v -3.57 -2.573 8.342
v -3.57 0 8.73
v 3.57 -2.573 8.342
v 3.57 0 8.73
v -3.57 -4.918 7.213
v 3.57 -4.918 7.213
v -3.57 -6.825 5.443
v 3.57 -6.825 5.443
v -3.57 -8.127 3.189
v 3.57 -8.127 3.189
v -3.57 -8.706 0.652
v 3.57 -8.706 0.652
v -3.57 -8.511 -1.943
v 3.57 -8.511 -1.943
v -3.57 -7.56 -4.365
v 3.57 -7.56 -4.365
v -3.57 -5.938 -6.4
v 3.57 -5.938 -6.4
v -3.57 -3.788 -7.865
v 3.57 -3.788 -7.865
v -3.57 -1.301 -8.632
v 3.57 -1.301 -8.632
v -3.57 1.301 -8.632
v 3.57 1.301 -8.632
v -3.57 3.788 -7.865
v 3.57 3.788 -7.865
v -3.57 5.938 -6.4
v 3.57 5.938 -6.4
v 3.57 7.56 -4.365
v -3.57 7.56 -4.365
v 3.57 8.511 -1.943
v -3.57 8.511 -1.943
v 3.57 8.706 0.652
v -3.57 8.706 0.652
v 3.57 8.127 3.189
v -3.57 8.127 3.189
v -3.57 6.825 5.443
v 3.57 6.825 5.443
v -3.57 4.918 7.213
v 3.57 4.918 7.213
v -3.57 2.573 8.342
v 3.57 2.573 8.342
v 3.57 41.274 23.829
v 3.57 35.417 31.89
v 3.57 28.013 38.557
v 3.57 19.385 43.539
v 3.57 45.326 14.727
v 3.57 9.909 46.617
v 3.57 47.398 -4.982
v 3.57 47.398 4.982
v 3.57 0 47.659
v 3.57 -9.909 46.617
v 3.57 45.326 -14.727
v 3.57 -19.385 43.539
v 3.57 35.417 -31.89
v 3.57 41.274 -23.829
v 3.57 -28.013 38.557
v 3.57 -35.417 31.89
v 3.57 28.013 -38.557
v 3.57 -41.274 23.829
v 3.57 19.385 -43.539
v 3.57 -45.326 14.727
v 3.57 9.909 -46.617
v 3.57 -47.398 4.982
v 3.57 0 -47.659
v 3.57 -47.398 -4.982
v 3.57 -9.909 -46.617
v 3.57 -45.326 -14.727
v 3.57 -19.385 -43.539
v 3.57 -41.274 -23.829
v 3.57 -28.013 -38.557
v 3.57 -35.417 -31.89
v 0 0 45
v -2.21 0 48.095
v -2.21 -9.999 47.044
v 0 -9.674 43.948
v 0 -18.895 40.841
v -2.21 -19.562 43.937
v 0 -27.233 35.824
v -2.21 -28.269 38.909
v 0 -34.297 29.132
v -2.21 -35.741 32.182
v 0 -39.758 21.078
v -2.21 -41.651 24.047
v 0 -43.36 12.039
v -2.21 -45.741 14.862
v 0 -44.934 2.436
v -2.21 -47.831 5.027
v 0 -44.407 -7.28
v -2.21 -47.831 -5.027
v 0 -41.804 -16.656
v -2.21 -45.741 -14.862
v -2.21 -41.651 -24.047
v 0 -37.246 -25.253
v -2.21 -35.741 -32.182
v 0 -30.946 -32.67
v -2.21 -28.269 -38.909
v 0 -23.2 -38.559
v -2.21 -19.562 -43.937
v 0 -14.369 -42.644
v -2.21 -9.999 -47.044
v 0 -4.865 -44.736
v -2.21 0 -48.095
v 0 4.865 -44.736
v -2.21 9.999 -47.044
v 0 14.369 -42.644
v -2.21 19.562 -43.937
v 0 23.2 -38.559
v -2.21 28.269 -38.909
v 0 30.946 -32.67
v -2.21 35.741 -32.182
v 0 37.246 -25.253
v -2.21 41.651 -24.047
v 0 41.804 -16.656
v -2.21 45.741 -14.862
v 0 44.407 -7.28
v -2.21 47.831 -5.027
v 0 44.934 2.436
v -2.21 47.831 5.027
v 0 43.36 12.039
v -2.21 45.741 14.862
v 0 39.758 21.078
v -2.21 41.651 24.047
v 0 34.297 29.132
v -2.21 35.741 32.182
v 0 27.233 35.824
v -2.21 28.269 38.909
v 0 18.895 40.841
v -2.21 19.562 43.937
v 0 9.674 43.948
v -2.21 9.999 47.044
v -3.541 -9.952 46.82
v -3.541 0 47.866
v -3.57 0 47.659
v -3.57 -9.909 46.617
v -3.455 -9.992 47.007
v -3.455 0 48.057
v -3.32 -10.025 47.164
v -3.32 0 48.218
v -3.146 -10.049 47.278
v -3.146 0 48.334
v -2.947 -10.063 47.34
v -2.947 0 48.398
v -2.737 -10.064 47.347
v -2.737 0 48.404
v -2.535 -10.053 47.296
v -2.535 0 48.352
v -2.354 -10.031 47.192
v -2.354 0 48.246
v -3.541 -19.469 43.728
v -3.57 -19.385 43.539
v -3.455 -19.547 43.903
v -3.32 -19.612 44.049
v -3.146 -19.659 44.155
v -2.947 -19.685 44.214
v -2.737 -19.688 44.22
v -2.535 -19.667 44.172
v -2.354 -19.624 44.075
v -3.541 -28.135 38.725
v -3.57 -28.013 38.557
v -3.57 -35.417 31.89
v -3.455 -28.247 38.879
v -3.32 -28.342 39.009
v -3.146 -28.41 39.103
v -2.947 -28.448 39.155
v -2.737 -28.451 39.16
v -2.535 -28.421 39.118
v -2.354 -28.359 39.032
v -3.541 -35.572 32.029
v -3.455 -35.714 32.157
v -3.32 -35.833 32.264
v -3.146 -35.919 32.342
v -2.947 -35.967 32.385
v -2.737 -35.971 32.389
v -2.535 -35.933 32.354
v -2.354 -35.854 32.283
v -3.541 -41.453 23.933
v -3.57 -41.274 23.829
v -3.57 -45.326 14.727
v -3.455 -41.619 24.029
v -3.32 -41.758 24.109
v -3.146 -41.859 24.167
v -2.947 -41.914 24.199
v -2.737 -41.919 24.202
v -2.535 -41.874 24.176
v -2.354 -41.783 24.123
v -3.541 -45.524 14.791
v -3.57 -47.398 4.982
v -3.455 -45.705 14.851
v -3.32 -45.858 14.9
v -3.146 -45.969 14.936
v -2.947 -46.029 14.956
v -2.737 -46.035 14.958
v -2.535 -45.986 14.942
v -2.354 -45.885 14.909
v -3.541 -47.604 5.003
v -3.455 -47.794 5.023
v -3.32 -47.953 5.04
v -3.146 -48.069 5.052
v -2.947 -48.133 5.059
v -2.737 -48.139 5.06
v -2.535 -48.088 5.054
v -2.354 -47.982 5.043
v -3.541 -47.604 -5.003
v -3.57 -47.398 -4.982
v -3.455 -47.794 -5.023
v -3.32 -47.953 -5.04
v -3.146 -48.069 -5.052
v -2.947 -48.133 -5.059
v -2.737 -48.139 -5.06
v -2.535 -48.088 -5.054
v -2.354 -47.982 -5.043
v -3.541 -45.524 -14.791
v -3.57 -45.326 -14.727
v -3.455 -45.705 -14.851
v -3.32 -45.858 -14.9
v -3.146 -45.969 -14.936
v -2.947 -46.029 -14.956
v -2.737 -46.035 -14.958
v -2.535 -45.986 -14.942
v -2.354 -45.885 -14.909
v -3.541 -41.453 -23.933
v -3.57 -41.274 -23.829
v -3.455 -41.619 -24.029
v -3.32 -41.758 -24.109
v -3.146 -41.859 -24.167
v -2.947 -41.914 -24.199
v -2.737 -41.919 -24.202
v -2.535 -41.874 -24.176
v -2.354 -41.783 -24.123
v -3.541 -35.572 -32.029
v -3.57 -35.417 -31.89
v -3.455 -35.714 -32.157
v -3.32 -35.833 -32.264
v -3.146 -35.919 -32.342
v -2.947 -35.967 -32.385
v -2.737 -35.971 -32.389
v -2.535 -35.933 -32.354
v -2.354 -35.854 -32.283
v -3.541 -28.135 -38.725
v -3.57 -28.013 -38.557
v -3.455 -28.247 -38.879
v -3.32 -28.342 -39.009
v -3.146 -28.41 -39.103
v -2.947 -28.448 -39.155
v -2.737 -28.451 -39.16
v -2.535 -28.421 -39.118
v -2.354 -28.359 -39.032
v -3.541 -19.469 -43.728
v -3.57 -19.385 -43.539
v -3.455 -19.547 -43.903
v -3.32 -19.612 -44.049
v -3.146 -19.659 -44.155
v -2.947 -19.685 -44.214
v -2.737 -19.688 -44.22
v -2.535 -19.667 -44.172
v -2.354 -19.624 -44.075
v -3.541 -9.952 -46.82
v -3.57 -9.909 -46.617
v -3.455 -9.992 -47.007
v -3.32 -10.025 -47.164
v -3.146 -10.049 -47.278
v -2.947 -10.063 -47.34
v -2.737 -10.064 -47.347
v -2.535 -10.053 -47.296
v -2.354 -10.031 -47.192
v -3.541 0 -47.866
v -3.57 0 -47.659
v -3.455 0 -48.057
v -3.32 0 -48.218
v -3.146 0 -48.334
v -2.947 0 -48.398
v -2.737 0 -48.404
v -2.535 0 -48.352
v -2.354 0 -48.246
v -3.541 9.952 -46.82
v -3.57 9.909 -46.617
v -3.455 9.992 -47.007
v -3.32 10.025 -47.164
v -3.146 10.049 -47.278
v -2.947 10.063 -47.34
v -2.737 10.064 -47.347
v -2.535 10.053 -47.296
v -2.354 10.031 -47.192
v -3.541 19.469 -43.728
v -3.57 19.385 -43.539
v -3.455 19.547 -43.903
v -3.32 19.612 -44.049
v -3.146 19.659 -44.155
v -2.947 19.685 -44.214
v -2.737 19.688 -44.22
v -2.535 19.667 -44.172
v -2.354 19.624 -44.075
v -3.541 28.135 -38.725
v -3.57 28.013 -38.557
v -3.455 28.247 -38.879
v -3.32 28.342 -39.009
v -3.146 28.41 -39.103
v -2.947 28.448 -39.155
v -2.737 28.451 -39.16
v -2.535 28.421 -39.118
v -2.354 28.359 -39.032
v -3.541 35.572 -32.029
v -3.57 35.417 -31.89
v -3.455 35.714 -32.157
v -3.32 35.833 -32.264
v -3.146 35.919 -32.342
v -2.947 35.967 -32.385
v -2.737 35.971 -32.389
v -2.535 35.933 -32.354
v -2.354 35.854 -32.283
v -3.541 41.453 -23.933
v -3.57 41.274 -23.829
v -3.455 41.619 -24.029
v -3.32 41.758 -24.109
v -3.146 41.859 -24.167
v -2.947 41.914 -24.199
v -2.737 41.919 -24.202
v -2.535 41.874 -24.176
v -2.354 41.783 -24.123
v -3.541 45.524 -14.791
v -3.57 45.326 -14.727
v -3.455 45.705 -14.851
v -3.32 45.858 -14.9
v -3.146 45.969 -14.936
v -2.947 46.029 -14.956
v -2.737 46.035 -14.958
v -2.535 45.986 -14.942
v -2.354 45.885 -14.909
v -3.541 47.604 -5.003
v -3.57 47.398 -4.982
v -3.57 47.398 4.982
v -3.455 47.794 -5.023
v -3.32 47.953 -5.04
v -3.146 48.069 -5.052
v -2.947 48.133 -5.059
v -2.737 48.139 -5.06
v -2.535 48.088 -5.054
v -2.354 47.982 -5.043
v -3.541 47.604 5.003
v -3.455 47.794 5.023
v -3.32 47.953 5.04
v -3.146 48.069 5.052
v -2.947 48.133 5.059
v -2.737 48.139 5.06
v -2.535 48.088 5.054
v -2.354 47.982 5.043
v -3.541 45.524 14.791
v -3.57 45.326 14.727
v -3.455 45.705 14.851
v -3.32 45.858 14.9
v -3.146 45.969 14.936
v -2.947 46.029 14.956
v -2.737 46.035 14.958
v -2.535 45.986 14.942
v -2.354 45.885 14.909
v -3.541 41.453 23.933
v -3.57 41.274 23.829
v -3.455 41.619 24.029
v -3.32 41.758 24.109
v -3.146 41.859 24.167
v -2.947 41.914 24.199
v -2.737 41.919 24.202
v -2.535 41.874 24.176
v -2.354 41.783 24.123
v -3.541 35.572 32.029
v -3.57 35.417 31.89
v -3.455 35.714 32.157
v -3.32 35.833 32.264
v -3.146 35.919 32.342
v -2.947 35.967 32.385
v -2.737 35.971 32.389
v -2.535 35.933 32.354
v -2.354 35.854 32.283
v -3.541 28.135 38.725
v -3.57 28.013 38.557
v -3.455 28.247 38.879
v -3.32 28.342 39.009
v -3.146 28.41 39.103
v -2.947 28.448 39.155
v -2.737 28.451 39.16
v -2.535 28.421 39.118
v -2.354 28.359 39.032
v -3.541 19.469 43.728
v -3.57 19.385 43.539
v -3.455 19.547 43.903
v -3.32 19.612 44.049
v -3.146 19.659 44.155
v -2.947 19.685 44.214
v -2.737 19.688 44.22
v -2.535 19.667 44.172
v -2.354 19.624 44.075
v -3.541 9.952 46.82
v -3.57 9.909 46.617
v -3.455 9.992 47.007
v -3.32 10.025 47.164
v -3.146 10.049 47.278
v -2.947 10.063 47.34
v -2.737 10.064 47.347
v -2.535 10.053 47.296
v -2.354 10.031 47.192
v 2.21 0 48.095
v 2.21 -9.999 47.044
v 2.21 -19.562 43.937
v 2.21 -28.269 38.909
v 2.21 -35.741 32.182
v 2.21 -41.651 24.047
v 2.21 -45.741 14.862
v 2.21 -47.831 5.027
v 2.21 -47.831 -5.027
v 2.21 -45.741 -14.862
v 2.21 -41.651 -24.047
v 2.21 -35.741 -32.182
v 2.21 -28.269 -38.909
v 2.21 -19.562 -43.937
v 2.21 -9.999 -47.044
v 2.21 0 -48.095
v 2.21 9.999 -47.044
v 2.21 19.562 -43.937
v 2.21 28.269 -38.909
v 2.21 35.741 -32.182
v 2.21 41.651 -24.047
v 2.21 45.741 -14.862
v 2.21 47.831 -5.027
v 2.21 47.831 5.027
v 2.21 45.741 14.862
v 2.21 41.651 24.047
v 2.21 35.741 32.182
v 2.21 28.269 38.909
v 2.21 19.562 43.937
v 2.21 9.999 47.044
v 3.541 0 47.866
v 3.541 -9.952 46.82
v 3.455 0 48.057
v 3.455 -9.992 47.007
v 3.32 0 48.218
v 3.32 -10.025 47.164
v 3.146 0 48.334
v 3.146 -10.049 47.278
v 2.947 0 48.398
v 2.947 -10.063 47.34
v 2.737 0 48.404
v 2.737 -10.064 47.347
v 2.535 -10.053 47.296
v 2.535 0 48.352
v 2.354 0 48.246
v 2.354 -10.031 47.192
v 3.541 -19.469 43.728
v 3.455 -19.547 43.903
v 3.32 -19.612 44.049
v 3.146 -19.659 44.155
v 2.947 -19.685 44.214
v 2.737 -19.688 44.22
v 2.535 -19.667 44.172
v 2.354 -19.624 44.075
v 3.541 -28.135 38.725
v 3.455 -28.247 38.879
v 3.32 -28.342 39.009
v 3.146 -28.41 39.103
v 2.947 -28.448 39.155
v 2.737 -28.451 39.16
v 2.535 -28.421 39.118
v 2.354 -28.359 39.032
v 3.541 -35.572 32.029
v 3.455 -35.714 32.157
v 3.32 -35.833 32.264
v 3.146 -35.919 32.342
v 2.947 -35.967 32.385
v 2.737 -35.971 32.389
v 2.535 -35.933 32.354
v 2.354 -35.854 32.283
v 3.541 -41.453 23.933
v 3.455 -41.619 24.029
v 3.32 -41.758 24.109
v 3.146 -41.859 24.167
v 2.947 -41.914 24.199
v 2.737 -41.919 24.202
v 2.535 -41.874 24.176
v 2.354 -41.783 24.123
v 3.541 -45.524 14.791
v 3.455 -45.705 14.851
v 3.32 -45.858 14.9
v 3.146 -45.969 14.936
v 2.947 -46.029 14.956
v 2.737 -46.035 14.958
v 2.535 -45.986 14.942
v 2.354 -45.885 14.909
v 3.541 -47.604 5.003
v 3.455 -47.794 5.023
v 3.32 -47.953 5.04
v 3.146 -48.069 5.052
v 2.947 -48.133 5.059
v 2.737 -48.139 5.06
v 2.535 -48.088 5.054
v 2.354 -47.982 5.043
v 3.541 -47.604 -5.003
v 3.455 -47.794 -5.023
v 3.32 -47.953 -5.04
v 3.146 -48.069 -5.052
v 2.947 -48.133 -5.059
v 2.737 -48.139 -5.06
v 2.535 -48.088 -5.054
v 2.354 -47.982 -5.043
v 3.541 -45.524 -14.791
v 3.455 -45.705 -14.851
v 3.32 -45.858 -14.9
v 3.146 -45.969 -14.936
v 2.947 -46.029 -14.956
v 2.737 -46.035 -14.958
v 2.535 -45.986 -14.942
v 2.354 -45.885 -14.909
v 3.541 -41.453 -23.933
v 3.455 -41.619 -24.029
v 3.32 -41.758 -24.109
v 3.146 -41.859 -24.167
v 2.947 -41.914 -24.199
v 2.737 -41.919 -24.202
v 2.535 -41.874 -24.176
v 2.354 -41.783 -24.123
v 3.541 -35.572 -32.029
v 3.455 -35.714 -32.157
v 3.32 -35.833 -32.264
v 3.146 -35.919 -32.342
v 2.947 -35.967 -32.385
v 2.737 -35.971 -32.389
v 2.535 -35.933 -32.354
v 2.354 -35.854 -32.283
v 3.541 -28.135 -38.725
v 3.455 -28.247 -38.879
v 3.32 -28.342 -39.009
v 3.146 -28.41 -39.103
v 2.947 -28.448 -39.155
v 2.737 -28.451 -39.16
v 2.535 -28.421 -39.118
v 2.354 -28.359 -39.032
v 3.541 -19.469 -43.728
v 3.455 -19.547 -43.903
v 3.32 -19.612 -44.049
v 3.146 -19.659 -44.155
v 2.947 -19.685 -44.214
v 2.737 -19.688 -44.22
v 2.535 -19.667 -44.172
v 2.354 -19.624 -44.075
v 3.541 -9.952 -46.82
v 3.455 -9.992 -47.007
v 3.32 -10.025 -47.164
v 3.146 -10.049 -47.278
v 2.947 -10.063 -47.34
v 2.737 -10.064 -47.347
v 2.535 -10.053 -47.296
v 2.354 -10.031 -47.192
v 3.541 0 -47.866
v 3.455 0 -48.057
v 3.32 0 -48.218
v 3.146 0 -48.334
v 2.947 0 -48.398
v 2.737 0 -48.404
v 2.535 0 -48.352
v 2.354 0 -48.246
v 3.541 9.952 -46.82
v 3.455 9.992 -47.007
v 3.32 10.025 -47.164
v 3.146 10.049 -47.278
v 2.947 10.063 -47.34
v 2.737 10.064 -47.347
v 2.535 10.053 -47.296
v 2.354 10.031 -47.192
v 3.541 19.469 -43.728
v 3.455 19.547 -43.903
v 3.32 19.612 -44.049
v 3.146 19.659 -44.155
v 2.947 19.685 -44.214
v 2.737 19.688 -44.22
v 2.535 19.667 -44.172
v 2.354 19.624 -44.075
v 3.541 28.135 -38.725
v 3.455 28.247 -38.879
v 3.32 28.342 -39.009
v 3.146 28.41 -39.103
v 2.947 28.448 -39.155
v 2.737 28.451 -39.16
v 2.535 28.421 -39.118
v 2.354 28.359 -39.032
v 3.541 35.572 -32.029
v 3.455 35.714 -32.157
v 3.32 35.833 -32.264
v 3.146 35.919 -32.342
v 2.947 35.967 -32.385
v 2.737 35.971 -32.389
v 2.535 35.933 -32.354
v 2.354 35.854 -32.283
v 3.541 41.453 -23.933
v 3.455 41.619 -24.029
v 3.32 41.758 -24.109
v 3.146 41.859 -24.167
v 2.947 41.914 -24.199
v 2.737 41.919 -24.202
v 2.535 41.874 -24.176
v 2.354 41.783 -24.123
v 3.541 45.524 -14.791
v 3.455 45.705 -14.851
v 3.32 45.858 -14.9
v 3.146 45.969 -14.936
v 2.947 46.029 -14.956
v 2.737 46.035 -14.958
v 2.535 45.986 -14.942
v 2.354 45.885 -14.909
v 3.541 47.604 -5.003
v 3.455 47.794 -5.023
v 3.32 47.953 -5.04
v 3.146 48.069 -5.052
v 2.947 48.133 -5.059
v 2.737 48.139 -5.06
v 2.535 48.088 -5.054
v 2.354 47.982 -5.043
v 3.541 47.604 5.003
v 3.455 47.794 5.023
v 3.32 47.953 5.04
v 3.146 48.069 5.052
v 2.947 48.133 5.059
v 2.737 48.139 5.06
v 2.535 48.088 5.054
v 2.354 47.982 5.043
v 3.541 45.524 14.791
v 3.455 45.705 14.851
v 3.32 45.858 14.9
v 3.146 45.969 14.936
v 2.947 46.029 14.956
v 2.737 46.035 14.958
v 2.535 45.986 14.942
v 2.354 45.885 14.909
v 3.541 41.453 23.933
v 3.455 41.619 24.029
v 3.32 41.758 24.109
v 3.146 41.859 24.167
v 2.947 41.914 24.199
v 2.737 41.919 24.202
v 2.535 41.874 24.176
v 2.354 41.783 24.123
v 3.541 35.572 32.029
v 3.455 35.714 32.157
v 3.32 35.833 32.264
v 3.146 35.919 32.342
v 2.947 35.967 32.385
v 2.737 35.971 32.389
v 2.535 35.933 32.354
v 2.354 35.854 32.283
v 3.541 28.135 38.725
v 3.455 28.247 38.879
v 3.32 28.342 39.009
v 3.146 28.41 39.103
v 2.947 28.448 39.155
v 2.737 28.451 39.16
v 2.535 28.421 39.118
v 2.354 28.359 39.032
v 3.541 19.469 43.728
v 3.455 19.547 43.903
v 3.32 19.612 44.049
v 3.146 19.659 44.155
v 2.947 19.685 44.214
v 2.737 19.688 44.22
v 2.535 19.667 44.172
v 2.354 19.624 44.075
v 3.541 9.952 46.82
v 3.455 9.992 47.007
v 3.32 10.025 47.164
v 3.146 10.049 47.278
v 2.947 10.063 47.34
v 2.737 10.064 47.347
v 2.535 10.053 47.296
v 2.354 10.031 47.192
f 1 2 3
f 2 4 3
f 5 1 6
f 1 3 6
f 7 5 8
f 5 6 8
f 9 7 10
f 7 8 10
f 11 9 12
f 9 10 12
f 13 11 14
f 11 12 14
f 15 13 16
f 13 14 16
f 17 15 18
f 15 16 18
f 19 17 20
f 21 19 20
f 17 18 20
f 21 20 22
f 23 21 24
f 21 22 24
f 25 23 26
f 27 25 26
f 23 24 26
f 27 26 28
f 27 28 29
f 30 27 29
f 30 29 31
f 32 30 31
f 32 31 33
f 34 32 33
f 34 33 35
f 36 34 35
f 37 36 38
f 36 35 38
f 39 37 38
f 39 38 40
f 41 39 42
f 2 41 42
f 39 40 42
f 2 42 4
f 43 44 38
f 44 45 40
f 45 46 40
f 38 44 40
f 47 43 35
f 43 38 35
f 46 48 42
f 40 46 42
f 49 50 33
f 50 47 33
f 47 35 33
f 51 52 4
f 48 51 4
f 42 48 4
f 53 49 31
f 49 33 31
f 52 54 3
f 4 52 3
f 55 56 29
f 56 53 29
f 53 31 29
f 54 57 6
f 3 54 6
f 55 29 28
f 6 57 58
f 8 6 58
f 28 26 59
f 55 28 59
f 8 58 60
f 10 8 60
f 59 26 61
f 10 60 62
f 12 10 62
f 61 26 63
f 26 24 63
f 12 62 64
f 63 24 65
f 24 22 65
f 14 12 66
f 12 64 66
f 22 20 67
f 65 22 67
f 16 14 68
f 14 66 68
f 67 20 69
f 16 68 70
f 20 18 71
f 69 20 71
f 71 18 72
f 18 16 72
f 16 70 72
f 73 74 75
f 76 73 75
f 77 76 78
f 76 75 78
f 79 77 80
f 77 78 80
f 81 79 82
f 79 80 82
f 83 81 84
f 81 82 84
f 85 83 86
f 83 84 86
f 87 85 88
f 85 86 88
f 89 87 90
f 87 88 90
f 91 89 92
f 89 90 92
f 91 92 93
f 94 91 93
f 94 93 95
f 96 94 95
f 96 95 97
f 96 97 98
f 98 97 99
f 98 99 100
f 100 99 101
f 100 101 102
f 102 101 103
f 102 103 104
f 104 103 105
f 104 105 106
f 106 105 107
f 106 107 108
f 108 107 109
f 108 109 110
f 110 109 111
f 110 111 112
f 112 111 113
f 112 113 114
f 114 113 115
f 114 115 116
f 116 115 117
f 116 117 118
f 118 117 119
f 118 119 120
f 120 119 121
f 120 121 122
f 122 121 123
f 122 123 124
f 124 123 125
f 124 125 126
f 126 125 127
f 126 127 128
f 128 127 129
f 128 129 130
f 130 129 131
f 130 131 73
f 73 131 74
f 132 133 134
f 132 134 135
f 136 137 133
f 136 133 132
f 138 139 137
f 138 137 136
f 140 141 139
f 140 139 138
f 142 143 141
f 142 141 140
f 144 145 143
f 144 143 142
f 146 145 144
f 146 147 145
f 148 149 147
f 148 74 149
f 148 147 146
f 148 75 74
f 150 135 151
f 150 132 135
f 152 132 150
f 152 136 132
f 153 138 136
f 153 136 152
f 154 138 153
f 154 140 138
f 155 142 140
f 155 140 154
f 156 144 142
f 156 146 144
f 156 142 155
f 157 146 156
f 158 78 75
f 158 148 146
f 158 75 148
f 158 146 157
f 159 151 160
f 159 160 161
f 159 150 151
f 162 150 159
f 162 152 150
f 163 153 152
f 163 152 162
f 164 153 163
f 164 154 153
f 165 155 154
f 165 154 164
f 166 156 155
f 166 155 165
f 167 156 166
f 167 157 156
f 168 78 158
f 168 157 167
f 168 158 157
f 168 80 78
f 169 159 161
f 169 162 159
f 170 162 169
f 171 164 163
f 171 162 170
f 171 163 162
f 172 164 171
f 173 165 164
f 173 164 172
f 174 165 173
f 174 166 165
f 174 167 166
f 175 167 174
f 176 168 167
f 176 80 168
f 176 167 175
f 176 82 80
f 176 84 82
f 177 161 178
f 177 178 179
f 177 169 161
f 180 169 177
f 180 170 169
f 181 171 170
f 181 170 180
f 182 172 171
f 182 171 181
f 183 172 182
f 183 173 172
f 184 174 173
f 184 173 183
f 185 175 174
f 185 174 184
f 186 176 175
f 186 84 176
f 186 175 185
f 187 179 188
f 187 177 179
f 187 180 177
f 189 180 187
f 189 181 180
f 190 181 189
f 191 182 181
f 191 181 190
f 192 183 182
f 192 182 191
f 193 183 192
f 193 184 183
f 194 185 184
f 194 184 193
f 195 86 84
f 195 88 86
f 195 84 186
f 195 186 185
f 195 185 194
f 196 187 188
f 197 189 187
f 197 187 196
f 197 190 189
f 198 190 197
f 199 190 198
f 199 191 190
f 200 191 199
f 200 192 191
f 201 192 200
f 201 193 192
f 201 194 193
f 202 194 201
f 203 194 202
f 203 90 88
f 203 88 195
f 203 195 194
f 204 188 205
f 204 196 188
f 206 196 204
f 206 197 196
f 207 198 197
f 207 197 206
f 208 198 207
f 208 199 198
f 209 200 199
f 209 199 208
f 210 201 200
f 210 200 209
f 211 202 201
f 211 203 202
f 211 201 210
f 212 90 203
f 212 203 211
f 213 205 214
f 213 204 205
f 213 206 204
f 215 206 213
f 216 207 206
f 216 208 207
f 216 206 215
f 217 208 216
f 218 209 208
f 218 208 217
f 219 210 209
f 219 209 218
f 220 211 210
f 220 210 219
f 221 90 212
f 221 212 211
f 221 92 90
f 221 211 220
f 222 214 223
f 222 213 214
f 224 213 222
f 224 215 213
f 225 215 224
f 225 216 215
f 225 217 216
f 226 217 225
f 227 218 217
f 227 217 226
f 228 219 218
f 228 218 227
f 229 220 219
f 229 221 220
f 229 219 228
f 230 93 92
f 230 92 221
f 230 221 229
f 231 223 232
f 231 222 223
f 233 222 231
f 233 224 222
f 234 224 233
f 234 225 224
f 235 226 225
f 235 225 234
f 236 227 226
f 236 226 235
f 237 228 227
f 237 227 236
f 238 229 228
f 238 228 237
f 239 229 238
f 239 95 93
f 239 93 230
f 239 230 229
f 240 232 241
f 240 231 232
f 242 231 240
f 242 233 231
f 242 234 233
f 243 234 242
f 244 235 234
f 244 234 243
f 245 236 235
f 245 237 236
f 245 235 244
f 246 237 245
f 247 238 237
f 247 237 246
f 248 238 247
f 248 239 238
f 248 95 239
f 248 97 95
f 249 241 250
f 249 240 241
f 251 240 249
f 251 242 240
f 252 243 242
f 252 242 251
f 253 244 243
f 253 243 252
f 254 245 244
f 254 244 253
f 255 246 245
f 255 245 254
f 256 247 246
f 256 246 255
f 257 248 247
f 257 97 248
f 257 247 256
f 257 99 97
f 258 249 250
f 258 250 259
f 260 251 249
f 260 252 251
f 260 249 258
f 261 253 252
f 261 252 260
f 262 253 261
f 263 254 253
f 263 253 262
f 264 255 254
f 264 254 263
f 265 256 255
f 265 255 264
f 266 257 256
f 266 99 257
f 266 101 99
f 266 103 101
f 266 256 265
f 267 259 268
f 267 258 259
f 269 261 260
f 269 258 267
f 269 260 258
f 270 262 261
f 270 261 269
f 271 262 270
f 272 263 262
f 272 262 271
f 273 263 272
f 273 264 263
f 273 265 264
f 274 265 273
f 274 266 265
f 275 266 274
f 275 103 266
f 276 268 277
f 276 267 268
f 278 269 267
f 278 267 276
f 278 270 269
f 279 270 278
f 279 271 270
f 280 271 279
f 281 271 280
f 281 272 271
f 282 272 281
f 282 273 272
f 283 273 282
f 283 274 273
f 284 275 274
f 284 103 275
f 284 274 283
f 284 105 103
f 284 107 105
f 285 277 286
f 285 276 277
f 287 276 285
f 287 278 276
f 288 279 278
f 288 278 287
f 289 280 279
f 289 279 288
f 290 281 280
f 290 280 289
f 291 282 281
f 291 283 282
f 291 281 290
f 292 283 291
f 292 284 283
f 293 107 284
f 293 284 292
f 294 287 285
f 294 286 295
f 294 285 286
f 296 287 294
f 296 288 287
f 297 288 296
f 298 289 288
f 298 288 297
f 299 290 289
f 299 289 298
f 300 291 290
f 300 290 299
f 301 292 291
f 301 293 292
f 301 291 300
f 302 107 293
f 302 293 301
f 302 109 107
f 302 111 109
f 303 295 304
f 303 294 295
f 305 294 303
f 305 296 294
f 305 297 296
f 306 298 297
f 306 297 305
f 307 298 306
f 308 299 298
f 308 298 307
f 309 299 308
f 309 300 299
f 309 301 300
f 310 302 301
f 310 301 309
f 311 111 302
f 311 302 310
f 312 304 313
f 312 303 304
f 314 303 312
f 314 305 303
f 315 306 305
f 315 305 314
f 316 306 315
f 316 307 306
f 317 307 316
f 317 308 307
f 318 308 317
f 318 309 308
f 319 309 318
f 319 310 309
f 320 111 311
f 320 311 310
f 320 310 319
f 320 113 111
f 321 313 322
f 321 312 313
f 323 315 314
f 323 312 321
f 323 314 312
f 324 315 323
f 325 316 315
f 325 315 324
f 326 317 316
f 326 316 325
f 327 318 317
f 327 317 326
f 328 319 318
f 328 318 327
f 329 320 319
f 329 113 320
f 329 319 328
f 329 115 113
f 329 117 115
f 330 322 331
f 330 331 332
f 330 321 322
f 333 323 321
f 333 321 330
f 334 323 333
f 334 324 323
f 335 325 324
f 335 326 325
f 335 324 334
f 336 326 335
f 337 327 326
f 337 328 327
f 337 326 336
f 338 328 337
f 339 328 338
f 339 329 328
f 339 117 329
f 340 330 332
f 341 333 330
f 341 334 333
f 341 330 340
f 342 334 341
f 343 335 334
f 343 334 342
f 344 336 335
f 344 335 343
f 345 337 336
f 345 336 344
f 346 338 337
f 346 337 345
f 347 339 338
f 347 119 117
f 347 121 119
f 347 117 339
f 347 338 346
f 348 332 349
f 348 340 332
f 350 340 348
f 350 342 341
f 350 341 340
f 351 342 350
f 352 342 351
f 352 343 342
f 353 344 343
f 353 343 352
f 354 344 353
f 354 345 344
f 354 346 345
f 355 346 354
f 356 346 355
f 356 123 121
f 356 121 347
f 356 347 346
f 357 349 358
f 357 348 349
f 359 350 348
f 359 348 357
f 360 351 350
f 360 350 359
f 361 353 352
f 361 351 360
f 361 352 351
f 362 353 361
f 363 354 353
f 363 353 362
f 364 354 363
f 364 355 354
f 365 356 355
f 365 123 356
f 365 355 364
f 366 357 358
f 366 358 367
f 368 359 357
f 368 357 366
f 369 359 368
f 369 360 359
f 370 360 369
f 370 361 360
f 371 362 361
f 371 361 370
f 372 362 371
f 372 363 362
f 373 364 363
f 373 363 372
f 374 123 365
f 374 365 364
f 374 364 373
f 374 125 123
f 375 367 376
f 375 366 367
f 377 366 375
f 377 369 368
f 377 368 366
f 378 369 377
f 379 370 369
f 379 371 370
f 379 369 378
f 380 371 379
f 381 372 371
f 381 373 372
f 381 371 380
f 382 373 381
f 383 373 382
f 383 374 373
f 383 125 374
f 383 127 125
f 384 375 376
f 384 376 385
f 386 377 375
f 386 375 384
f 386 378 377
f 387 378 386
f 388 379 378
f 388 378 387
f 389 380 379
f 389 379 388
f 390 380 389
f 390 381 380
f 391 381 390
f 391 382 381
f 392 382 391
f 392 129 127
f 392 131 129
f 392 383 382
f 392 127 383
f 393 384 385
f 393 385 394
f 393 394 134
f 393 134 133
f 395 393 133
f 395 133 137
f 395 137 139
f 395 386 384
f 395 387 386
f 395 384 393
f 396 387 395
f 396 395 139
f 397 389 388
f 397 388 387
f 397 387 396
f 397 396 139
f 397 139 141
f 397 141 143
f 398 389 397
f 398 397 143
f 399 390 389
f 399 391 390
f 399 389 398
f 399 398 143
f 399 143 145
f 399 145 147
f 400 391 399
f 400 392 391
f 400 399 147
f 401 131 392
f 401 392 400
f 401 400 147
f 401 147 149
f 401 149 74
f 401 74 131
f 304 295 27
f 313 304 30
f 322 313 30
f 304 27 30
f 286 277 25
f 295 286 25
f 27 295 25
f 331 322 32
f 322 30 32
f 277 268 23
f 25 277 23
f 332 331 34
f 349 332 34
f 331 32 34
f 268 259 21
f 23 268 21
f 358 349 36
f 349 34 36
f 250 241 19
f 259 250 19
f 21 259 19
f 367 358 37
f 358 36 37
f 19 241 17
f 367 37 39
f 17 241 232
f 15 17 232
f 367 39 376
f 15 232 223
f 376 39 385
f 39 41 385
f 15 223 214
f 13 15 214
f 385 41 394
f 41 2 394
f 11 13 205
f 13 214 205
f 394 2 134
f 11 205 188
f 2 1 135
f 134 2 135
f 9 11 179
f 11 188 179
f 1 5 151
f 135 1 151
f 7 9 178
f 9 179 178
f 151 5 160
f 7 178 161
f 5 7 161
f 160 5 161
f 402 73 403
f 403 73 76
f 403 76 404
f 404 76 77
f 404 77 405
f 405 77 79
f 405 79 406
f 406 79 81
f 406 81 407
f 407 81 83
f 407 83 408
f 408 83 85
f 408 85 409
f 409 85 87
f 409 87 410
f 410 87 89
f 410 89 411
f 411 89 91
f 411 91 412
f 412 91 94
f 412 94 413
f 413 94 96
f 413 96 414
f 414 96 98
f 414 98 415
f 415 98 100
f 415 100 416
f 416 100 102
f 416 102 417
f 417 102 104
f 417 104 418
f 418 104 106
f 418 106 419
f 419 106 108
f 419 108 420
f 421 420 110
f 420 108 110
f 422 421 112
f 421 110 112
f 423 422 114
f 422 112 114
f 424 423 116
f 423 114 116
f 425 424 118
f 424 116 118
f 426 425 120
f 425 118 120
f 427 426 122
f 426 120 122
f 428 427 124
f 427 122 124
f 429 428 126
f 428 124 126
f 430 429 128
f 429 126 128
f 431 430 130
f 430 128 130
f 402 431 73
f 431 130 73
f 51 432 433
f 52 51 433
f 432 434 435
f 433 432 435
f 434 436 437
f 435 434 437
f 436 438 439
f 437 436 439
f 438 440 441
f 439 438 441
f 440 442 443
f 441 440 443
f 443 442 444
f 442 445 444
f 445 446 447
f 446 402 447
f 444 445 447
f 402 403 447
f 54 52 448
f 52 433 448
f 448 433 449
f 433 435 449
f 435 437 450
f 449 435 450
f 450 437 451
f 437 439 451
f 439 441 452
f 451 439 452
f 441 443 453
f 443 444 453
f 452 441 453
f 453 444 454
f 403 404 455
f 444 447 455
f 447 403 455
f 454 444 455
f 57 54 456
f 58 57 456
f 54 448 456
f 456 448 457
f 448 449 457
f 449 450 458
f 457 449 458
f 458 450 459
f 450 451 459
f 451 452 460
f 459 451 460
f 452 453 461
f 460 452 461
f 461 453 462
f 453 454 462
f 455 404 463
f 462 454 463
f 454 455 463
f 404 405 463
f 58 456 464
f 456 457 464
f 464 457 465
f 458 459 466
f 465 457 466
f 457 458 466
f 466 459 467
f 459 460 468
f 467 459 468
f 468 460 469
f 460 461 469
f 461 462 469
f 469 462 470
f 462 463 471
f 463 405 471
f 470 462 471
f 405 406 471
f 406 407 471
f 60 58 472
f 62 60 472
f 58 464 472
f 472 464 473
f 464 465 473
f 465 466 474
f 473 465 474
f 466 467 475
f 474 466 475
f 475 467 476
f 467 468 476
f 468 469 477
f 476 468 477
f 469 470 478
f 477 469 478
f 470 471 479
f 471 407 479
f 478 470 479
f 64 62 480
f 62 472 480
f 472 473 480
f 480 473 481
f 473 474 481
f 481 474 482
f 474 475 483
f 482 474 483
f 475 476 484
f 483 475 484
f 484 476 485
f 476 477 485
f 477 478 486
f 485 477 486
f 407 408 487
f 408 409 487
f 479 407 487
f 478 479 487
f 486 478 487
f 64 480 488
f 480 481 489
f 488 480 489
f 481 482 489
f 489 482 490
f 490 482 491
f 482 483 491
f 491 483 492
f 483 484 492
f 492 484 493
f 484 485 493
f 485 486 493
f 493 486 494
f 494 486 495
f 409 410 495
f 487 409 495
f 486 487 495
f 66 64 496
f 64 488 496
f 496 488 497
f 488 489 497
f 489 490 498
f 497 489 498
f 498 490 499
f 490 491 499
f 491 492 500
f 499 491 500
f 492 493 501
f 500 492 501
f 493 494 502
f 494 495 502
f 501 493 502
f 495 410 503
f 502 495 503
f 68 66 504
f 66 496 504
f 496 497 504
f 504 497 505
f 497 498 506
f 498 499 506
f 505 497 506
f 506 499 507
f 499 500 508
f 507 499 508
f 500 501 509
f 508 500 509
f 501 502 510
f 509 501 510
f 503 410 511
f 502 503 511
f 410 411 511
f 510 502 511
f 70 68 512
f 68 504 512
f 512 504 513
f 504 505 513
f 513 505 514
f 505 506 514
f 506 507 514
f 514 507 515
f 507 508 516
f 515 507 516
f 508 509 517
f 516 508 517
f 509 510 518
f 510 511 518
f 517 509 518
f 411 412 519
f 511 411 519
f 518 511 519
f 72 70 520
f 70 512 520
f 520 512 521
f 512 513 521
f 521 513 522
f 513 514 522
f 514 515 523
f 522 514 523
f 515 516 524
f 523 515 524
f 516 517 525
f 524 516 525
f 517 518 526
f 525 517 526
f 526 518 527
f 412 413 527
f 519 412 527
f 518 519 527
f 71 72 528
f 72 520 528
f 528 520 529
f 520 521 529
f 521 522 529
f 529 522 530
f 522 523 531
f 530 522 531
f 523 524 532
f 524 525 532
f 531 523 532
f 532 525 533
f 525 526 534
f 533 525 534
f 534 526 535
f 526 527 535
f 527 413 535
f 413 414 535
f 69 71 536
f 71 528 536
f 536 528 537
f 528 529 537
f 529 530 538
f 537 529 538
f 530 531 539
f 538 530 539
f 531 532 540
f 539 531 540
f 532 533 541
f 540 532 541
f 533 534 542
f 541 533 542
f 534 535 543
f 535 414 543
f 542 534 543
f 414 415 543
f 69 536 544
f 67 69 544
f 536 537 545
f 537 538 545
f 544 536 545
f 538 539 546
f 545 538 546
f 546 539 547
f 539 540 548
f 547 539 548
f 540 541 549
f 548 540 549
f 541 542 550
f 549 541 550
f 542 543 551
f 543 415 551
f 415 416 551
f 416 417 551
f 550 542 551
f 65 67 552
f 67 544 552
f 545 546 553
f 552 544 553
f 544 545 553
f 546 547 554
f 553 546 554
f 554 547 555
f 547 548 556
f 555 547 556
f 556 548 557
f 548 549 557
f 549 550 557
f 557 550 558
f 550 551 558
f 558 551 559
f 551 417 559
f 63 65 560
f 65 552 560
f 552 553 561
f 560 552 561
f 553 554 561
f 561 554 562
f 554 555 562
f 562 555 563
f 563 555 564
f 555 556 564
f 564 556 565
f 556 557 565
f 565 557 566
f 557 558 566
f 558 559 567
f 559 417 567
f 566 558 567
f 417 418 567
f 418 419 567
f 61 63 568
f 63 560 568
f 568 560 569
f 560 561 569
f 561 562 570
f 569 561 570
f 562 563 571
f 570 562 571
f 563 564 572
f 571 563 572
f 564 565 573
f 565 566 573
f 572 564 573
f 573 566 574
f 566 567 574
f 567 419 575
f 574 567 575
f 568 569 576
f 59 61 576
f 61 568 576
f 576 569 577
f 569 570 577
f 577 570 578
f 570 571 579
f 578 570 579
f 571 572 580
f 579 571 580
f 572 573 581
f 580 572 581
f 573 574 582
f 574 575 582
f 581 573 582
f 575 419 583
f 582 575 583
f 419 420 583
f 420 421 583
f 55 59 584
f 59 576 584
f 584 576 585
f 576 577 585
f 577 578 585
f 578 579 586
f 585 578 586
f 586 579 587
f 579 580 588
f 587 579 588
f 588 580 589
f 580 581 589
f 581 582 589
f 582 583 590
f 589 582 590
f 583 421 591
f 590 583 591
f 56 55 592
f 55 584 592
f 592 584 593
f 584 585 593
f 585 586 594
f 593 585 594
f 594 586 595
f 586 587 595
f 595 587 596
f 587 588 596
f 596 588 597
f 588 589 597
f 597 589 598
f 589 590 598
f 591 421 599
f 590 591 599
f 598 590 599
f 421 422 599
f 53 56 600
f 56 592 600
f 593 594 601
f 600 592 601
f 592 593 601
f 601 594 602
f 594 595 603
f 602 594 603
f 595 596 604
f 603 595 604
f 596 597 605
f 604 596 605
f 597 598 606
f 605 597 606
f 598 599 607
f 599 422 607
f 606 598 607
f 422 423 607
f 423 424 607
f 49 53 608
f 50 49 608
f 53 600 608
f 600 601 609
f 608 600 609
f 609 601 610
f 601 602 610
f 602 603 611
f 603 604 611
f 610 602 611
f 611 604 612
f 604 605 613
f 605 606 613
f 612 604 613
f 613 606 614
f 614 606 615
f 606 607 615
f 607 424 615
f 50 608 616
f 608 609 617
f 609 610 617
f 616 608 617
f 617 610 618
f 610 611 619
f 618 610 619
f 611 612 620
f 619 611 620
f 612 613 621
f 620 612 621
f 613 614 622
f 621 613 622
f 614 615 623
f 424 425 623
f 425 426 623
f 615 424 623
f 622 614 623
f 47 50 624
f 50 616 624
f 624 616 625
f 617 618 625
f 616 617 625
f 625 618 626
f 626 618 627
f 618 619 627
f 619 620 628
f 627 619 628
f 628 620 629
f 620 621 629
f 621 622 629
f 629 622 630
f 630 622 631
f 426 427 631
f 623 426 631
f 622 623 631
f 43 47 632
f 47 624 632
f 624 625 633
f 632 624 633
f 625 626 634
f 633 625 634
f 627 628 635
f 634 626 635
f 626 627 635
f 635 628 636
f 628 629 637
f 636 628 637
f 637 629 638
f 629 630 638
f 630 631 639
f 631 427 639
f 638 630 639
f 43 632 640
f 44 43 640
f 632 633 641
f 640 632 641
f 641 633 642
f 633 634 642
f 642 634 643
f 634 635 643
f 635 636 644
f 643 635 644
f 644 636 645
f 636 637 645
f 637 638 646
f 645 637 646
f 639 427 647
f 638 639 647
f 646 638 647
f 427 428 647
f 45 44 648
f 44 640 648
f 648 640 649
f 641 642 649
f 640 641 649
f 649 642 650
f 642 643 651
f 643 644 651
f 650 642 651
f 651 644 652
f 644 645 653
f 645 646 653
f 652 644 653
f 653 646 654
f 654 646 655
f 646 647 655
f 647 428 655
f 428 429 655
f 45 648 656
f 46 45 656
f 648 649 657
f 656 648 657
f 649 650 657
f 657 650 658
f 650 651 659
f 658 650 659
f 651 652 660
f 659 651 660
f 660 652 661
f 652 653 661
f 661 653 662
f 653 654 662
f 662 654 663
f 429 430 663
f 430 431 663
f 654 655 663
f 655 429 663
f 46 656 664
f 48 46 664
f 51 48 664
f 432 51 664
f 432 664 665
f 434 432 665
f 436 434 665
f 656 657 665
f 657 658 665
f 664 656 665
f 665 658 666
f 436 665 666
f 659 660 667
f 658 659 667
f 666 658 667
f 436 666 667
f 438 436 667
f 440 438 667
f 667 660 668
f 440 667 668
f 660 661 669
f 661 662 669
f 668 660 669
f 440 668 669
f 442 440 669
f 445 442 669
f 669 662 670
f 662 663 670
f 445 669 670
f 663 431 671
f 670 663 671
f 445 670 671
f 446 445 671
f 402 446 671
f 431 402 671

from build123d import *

# Parameters (mm, degrees)
FILLET1_R          = 0.75
SKETCH2_R          = 8.73
CUT_EXTRUDE1_DEPTH = 5


with BuildPart() as part:
    # Sketch1 → Revolve1 (revolve)
    with BuildSketch(Plane.XY, mode=Mode.PRIVATE) as revolve1_sk:
        Polygon((-3.57, 50), (-3.57, 0), (0, 0), (0, 45), align=None)
        Polygon((0, 45), (0, 0), (3.57, 0), (3.57, 50), align=None)
    revolve(revolve1_sk.sketch.rotate(Axis((0, 0, 0), (1, 0, 0)), 90), axis=Axis((0, 0, 0), (1, 0, 0)))

    # Fillet1
    fillet1_edges = [part.edges().sort_by_distance(p)[0] for p in [
        (-3.57, 0, -50),
        (3.57, 0, -50),
    ]]
    fillet(fillet1_edges, radius=FILLET1_R)

    # Sketch2 → Cut-Extrude1 (cut, symmetric)
    with BuildSketch(Plane(origin=(0, 0, 0), x_dir=(0, 0, -1), z_dir=(1, 0, 0))):
        with Locations(Location((0, 0, 0), (0, 0, 180))):
            Circle(SKETCH2_R)
    extrude(amount=CUT_EXTRUDE1_DEPTH, both=True, mode=Mode.SUBTRACT)


solid = part.part
